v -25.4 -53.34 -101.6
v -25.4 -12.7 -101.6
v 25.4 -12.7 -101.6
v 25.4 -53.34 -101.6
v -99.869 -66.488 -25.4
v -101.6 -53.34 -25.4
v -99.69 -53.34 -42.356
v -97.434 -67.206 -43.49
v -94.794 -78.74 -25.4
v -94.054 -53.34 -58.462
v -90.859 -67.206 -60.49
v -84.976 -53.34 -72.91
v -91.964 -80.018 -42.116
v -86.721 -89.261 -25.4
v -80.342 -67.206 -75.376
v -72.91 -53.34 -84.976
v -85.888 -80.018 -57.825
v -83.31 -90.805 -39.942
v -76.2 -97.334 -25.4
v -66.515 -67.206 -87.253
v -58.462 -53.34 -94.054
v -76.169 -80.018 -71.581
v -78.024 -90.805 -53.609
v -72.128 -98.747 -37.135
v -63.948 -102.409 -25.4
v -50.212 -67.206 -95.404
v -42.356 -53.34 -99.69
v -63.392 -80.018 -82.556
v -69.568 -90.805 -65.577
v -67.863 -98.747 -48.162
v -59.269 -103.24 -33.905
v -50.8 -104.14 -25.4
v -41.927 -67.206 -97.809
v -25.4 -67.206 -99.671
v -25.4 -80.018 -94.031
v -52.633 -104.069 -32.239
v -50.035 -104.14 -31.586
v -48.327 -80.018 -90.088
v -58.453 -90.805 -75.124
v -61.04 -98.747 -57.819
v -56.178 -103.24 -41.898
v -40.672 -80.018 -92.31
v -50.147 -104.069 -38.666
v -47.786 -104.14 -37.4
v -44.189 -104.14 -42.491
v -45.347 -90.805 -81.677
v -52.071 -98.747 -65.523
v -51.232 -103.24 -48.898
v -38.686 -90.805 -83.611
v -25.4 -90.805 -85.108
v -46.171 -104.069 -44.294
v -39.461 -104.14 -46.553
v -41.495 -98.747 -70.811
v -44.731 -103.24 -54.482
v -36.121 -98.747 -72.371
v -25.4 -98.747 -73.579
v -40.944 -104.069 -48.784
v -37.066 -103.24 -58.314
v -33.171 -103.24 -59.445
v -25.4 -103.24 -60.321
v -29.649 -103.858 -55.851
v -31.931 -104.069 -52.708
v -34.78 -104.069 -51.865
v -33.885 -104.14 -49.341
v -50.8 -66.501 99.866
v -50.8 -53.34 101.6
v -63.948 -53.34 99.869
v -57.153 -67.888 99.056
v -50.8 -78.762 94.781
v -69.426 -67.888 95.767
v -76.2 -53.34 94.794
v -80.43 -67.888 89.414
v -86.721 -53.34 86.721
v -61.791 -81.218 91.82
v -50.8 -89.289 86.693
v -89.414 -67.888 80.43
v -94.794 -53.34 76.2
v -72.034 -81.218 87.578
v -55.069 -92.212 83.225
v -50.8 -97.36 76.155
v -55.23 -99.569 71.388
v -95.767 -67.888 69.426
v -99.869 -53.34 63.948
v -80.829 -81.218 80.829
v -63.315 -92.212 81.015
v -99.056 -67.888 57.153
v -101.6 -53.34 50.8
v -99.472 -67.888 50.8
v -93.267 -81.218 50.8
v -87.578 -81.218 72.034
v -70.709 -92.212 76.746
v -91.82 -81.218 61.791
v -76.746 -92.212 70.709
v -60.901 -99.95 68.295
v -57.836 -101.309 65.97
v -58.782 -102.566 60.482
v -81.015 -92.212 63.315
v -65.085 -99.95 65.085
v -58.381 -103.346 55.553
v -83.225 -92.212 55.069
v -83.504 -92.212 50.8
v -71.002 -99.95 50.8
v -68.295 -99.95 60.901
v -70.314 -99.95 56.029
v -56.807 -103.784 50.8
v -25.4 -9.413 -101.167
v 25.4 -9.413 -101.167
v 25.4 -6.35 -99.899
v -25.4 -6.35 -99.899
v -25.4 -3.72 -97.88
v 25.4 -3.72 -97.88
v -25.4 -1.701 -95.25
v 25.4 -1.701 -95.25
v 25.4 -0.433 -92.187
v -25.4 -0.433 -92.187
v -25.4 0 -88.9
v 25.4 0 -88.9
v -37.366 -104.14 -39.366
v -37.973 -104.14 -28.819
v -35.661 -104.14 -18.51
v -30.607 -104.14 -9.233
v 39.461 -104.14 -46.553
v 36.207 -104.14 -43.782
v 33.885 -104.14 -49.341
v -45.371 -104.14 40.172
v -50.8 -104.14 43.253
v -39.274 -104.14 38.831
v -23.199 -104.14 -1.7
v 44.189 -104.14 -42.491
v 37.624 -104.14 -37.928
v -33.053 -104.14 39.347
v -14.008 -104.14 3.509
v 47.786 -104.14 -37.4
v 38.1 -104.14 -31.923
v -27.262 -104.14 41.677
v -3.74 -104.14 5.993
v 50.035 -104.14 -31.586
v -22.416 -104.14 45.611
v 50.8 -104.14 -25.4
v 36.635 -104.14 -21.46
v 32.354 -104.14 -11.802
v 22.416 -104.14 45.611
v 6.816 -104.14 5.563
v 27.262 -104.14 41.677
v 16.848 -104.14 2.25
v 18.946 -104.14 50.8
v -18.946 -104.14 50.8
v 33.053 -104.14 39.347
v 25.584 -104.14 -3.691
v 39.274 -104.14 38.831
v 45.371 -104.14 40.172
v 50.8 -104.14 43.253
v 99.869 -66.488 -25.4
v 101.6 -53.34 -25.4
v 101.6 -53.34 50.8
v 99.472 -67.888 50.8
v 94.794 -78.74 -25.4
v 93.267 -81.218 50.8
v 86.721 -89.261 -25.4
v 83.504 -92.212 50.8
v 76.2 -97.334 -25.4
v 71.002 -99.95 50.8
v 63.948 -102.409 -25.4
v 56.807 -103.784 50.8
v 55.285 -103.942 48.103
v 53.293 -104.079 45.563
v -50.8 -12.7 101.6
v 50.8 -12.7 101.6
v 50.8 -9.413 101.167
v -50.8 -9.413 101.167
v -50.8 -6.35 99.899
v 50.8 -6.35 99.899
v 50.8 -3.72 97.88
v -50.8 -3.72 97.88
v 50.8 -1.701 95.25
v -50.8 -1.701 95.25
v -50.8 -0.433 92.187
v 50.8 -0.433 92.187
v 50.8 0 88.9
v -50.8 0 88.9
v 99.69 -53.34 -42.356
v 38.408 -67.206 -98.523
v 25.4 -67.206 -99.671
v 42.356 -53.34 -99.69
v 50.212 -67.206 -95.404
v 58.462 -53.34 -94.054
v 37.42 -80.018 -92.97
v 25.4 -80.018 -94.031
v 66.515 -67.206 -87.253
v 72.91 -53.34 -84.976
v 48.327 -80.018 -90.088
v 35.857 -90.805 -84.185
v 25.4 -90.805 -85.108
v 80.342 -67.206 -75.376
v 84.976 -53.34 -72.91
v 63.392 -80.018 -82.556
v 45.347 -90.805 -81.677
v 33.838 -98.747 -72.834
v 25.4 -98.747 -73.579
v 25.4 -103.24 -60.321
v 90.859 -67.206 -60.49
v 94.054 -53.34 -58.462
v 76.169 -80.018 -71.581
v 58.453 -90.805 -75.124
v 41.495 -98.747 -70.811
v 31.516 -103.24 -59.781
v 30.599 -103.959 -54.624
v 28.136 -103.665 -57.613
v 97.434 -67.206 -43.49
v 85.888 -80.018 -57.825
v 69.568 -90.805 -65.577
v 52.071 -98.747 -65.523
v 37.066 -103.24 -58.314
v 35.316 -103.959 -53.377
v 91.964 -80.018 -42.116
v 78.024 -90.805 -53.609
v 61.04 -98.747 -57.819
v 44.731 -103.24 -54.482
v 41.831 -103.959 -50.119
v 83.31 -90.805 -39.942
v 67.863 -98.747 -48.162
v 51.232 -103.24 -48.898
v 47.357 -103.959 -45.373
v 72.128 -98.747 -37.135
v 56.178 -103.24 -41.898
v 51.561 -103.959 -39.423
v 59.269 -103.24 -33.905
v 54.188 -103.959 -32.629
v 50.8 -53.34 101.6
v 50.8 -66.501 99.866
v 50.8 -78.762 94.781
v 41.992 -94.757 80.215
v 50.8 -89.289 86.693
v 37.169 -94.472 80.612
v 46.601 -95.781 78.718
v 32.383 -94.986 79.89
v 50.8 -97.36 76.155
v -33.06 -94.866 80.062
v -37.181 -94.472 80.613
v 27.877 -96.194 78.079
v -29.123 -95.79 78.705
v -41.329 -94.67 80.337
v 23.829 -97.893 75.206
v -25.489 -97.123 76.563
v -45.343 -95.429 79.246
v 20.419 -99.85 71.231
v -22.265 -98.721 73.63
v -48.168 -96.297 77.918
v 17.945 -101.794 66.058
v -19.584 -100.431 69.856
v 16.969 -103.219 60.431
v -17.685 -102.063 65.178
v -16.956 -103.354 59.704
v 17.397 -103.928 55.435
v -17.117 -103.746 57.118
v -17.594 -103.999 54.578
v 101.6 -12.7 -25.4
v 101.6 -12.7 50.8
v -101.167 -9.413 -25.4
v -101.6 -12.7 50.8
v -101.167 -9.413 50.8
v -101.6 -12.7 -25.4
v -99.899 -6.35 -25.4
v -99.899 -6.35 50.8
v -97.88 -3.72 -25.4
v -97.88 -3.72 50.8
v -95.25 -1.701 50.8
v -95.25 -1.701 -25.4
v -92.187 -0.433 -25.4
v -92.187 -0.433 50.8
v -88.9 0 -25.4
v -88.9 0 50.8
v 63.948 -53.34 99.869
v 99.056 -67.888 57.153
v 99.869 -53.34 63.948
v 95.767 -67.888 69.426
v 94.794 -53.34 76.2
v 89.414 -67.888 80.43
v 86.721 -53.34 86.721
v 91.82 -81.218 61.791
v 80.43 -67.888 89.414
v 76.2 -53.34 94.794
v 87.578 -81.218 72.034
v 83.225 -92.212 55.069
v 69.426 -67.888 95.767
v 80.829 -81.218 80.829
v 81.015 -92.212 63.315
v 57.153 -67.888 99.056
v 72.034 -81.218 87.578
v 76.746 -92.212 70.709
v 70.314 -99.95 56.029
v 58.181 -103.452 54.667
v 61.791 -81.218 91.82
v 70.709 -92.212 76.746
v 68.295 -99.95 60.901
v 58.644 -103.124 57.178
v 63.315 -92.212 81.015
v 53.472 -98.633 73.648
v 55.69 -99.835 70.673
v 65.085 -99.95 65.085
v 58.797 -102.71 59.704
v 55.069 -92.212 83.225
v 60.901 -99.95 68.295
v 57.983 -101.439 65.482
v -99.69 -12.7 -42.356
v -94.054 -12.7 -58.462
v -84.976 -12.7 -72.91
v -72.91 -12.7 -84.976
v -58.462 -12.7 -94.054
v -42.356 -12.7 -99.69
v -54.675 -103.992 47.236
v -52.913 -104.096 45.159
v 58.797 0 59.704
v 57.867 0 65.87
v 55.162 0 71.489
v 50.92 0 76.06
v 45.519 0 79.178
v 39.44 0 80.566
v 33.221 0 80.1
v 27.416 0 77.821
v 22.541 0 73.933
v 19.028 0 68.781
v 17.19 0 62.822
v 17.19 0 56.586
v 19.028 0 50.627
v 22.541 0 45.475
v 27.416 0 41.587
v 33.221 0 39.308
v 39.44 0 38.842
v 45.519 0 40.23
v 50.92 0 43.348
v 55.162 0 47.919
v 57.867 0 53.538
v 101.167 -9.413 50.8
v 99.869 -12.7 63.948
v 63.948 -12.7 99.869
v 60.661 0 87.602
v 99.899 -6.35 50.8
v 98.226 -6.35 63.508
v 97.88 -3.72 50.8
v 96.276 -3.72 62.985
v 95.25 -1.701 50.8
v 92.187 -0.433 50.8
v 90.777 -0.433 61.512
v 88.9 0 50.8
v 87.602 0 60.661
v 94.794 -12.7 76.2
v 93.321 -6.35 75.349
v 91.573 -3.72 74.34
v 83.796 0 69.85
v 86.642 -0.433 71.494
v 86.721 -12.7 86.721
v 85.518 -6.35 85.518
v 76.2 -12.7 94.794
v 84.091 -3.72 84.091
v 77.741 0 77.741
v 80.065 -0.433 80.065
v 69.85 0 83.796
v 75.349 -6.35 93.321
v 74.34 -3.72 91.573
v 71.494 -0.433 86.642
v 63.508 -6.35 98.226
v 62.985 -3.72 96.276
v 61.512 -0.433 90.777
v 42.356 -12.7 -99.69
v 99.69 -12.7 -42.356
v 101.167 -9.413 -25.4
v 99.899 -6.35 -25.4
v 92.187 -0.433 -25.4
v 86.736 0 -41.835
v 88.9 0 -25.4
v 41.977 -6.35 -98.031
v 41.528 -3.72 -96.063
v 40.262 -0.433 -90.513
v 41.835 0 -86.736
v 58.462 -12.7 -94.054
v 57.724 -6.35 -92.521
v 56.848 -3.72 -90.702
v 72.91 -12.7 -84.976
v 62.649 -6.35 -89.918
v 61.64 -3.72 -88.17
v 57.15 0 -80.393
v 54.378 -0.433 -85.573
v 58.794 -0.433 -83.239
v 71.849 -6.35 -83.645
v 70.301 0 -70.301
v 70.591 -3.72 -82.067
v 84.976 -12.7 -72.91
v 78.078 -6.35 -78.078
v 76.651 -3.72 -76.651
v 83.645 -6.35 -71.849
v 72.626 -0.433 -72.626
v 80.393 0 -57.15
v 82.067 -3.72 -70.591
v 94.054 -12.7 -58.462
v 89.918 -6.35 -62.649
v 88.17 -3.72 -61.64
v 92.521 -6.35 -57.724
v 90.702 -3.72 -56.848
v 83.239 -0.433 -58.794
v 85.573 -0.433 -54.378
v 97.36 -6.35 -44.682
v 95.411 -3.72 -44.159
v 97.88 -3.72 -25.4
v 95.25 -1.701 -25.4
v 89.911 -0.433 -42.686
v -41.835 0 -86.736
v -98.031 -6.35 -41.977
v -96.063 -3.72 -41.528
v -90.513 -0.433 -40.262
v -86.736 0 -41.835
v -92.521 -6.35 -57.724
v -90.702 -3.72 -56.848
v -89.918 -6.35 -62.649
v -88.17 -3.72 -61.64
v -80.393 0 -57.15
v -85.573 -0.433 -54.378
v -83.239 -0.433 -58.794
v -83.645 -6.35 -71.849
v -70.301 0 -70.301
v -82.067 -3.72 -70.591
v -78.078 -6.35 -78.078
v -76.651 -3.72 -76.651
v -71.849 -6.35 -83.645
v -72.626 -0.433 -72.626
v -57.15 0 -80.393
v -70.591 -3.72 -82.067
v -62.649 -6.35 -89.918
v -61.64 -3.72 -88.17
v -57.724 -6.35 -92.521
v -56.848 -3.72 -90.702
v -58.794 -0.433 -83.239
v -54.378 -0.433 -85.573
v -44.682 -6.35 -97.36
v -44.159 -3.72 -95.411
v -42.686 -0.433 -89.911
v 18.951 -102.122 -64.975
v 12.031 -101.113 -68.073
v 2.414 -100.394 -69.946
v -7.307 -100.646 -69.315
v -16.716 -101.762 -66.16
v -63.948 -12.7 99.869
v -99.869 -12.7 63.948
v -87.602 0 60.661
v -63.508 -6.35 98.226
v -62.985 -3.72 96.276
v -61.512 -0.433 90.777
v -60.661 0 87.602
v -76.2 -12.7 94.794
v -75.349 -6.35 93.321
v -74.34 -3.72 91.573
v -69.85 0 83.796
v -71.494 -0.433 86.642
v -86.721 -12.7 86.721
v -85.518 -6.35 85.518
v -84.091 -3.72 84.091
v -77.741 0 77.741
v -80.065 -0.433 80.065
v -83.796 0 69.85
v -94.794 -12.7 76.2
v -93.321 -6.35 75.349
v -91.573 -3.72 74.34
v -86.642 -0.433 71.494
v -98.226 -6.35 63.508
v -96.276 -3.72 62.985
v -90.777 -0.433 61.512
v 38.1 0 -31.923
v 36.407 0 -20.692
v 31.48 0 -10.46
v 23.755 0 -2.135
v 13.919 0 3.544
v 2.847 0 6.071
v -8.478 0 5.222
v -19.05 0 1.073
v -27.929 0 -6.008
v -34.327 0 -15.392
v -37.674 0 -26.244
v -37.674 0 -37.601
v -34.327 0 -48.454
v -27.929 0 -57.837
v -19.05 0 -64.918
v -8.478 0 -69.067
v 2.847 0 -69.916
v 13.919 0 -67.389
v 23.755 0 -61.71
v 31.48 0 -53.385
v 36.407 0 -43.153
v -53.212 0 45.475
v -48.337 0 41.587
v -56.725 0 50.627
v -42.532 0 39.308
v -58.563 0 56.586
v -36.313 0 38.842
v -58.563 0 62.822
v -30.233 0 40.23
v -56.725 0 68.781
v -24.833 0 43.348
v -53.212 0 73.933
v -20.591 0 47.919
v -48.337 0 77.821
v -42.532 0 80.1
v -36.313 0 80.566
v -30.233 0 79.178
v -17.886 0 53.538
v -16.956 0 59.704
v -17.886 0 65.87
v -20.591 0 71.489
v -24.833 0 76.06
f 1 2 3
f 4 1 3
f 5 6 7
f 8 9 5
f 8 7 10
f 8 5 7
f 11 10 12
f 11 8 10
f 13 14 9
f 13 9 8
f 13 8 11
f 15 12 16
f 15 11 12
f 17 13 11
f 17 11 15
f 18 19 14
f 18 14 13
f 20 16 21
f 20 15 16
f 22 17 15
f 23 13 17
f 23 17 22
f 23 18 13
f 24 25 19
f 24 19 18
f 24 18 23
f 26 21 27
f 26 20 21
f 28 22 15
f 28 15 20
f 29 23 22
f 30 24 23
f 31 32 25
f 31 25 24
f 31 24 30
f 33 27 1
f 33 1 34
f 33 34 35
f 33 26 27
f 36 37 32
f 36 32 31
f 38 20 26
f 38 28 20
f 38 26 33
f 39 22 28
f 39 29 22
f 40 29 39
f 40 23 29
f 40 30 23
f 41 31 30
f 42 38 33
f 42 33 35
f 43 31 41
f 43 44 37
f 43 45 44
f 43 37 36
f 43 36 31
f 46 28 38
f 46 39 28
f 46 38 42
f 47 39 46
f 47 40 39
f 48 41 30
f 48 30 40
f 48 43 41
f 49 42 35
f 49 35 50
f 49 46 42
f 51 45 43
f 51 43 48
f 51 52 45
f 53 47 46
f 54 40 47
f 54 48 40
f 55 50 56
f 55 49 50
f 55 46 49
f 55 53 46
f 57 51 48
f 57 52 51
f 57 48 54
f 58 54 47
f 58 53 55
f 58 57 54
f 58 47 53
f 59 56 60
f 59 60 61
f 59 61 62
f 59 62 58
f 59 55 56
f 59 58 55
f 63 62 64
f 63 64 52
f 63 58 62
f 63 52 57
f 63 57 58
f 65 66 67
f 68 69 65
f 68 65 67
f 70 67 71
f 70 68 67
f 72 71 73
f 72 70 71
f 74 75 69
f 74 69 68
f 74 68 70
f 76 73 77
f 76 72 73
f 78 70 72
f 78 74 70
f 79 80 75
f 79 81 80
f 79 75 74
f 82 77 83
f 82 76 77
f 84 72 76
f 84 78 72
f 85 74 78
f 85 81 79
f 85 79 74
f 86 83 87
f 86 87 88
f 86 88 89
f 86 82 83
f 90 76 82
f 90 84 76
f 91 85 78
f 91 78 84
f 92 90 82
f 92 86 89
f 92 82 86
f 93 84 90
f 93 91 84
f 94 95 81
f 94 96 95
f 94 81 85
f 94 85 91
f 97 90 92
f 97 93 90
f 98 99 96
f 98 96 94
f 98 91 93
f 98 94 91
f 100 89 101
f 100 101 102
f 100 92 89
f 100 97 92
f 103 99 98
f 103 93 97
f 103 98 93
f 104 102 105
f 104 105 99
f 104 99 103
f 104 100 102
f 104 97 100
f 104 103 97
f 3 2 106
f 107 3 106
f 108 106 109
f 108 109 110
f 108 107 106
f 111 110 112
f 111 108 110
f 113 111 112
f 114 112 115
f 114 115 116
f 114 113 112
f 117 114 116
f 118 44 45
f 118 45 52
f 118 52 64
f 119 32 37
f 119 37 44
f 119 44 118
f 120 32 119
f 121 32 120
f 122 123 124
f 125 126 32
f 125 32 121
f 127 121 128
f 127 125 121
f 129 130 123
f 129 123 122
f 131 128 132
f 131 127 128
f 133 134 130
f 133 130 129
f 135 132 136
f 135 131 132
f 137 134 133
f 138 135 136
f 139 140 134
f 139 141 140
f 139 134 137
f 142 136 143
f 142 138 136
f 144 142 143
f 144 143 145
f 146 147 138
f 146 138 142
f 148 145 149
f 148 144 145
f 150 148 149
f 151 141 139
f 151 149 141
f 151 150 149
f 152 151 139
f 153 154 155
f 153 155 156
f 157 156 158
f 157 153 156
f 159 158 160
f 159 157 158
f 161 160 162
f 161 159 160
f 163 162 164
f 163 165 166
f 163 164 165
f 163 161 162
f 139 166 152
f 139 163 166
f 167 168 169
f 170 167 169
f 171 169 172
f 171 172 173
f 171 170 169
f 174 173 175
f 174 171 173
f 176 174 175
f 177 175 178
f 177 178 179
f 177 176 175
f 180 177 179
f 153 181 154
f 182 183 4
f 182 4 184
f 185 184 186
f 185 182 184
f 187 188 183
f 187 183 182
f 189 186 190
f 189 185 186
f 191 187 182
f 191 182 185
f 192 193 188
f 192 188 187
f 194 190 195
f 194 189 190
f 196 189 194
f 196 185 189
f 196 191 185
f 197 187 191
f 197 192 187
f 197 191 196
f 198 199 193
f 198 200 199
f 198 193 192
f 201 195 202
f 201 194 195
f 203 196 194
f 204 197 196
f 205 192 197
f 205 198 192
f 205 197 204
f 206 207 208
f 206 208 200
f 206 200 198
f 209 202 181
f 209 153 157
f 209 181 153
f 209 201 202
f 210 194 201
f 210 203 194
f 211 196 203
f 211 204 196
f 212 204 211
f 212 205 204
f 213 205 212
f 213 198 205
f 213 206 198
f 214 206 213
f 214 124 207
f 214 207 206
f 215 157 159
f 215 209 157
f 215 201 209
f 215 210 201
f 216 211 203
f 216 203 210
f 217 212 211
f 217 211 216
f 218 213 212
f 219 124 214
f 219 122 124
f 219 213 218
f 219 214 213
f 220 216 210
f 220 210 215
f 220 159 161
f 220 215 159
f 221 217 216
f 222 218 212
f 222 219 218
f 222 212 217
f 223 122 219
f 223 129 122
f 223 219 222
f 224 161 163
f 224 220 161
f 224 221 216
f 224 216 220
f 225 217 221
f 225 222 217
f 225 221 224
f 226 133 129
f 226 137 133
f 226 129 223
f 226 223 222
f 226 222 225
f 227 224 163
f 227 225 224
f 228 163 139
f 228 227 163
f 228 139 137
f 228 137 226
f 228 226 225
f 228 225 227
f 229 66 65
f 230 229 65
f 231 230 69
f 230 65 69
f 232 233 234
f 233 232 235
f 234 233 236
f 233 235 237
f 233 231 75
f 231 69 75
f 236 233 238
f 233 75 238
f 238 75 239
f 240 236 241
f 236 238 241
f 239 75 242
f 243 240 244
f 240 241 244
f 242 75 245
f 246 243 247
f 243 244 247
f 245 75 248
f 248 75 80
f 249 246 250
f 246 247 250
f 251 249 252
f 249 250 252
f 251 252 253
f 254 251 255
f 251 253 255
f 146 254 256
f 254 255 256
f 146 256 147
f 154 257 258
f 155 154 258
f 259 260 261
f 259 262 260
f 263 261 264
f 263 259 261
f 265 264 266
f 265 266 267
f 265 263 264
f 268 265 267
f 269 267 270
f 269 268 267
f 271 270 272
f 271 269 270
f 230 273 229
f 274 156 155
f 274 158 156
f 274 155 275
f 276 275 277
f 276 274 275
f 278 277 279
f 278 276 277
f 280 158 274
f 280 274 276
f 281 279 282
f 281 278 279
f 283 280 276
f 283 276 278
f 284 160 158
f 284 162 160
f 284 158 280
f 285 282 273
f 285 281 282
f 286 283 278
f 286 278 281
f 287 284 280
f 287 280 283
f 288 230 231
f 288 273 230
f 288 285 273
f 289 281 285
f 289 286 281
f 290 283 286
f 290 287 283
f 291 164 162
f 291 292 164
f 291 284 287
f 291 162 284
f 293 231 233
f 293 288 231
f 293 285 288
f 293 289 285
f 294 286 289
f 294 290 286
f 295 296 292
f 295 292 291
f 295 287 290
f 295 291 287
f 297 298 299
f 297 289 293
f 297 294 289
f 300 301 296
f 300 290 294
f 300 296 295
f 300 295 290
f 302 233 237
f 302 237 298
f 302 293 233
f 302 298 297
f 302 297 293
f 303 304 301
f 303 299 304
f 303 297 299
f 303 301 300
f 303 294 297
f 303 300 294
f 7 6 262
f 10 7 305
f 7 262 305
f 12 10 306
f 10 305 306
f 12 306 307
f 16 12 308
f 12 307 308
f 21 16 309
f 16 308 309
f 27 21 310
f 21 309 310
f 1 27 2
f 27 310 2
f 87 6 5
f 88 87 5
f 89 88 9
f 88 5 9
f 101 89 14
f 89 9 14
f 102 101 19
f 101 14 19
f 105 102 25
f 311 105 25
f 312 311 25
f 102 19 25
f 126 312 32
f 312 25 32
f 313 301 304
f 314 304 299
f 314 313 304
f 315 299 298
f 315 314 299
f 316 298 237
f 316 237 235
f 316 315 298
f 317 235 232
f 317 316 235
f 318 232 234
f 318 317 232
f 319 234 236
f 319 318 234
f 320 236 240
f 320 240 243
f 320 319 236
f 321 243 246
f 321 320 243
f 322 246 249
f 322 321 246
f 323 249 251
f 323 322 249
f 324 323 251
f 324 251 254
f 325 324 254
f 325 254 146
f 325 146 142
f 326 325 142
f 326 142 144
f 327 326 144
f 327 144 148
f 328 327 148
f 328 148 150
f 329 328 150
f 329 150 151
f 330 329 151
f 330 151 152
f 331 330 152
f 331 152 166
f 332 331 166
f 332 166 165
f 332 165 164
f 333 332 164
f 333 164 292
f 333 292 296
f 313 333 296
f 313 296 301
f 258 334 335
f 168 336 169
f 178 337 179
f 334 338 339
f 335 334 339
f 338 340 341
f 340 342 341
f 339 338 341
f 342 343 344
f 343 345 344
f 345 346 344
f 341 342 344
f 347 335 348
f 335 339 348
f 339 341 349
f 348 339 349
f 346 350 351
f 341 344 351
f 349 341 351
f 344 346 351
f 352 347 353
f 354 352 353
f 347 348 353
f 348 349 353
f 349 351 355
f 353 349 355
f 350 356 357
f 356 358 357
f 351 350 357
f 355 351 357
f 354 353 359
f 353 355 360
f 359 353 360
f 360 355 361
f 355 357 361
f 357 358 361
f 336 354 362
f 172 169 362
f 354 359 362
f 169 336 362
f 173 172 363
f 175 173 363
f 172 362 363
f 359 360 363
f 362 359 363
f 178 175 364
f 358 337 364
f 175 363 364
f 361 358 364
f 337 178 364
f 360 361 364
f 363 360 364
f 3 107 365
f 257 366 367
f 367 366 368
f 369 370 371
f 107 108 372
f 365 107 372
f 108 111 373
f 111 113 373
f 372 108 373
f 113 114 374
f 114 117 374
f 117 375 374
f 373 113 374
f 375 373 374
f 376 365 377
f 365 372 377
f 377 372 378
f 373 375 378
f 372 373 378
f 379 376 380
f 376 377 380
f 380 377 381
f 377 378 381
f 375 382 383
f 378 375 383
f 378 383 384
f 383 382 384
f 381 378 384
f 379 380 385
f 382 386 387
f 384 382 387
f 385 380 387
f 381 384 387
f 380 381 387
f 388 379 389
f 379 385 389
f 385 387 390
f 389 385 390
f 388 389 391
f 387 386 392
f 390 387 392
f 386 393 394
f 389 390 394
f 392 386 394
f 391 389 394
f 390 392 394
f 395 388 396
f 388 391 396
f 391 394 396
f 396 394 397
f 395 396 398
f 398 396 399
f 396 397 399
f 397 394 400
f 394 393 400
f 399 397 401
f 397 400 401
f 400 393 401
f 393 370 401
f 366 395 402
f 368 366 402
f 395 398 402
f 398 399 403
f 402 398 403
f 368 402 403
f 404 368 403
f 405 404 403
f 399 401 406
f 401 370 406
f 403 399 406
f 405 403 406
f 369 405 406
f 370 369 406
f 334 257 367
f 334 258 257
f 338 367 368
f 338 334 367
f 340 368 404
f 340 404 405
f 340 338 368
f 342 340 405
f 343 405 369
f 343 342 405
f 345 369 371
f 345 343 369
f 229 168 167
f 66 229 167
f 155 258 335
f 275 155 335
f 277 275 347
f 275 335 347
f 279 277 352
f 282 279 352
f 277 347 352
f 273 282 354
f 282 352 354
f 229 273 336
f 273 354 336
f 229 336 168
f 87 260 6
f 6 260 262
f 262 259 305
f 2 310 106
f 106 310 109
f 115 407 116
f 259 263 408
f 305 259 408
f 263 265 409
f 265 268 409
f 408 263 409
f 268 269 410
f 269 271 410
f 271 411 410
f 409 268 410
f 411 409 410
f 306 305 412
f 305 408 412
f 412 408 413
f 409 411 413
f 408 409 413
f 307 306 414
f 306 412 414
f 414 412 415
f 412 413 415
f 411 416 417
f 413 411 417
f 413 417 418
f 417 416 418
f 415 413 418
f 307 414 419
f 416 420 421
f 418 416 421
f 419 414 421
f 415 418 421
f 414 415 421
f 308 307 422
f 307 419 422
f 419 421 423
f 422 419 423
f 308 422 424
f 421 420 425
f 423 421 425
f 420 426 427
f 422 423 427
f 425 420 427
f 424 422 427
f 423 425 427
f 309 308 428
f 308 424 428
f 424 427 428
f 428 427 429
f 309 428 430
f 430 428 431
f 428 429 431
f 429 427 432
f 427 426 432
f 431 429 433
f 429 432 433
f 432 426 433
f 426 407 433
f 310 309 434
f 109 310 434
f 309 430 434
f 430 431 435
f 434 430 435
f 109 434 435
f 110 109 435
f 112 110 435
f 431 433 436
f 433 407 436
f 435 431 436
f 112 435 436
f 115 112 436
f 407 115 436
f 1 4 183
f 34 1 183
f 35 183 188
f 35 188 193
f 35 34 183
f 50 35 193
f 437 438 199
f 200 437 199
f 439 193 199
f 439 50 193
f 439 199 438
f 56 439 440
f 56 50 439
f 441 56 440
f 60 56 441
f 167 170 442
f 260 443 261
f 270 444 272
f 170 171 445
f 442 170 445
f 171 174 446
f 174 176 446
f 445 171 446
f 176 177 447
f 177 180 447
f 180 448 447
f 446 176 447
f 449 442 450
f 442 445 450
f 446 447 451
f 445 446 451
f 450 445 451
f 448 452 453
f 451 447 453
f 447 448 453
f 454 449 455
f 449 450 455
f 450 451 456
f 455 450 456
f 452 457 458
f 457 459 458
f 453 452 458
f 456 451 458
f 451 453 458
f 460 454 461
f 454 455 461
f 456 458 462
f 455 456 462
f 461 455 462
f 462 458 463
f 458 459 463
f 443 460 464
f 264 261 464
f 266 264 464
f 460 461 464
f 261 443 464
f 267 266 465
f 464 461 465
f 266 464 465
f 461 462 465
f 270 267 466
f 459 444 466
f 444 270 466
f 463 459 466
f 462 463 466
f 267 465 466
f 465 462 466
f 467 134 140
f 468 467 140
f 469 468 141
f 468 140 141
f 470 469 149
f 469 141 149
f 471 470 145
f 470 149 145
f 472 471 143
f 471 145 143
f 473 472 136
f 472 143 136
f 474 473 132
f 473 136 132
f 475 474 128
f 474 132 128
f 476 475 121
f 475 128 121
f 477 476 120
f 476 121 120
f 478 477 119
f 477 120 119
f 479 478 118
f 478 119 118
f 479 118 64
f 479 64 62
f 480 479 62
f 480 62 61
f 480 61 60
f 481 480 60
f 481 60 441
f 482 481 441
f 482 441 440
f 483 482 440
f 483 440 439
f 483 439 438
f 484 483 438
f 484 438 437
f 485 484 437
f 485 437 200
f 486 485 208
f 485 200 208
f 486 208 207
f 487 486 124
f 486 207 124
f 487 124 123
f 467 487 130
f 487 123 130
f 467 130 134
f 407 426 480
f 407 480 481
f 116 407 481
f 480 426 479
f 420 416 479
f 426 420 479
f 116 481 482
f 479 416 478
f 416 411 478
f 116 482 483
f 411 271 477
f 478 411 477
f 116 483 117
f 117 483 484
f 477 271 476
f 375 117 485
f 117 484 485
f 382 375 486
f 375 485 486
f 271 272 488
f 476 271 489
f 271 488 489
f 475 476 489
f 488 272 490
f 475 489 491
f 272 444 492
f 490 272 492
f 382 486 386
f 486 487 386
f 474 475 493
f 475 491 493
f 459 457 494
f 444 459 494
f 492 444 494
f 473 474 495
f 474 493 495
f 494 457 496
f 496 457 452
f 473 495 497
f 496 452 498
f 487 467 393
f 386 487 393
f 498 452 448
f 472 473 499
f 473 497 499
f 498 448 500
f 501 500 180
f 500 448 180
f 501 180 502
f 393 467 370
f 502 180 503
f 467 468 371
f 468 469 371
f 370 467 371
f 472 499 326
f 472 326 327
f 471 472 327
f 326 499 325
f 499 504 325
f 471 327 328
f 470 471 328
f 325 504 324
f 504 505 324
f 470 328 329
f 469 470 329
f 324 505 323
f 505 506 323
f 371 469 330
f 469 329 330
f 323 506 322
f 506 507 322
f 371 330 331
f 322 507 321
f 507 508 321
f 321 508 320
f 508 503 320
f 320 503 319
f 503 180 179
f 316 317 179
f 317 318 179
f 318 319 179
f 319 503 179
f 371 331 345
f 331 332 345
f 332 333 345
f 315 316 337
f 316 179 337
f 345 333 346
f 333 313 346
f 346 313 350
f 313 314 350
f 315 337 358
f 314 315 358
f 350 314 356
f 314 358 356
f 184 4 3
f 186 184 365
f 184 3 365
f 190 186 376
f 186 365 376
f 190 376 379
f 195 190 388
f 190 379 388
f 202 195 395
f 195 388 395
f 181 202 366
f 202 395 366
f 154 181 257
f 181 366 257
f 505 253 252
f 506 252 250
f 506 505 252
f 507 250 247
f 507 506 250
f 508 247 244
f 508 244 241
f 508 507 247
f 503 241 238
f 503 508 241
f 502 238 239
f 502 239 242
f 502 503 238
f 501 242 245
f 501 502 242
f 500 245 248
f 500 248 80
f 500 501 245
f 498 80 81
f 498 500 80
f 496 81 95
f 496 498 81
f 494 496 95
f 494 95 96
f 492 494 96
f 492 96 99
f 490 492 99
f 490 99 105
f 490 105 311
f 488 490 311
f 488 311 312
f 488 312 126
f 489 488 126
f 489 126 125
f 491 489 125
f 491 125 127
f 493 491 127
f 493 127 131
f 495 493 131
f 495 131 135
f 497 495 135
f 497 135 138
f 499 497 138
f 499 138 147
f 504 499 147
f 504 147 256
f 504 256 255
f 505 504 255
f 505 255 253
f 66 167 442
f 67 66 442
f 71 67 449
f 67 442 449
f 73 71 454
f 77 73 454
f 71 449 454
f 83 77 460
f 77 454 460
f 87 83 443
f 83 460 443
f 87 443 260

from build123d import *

# Parameters (mm, degrees)
F0_R         = 20.9202002185
F1_DEPTH     = 104.14
F2_T1_DEPTH  = 101.6
F2_T3_DEPTH  = 76.2
F2_T5_DEPTH  = 50.8
F2_T8_ANGLE  = 90
F2_T10_ANGLE = 90
F2_T12_ANGLE = 90
F2_T14_ANGLE = 90
F3_R         = 12.7
F4_R         = 38.1
F5_DEPTH     = 104.1410001


# Not quite as in the source:
# - a fillet or chamfer that OpenCascade refuses, or shapes differently, is made with other operations: its cross-section is extruded or revolved along the edge and cut away or added


with BuildPart() as f1:
    # F0 (on Front) → F1 (new body)
    with BuildSketch(Plane.XZ):
        with BuildLine():
            Line((0, 101.6), (-50.8, 101.6))
            ThreePointArc((-50.8, 101.6), (-86.7210244843, 86.7210244843), (-101.6, 50.8))
            Line((-101.6, 50.8), (-101.6, -25.4))
            ThreePointArc((-101.6, -25.4), (-79.2815367264, -79.2815367264), (-25.4, -101.6))
            Line((-25.4, -101.6), (0, -101.6))
            Line((0, -101.6), (0, 101.6))
        make_face()
        with Locations((-37.8764681518, 59.70396474)):
            Circle(F0_R, mode=Mode.SUBTRACT)
        with BuildLine():
            Line((50.8, 101.6), (0, 101.6))
            Line((0, 101.6), (0, -101.6))
            Line((0, -101.6), (25.4, -101.6))
            ThreePointArc((25.4, -101.6), (79.2815367264, -79.2815367264), (101.6, -25.4))
            Line((101.6, -25.4), (101.6, 50.8))
            ThreePointArc((101.6, 50.8), (86.7210244843, 86.7210244843), (50.8, 101.6))
        make_face()
        with Locations((37.8764681518, 59.70396474)):
            Circle(F0_R, mode=Mode.SUBTRACT)
    extrude(amount=F1_DEPTH)

    # F2: fillet of radius 50.8 on 1 edges, made by hand

    # F2_s2 → F2_t1 (cut)
    with BuildSketch(Plane.YZ.offset(-50.8)):
        with BuildLine():
            ThreePointArc((-53.34, 101.6), (-89.2610244843, 86.7210244843), (-104.14, 50.8))
            Line((-104.14, 50.8), (-104.14, 101.6))
            Line((-104.14, 101.6), (-53.34, 101.6))
        make_face()
    extrude(amount=F2_T1_DEPTH, mode=Mode.SUBTRACT)

    # F2_s4 → F2_t3 (cut)
    with BuildSketch(Plane.XY.offset(-25.4)):
        with BuildLine():
            ThreePointArc((-101.6, -53.34), (-86.7210244843, -89.2610244843), (-50.8, -104.14))
            Line((-50.8, -104.14), (-101.6, -104.14))
            Line((-101.6, -104.14), (-101.6, -53.34))
        make_face()
        with BuildLine():
            ThreePointArc((101.6, -53.34), (86.7210244843, -89.2610244843), (50.8, -104.14))
            Line((50.8, -104.14), (101.6, -104.14))
            Line((101.6, -104.14), (101.6, -53.34))
        make_face()
    extrude(amount=F2_T3_DEPTH, mode=Mode.SUBTRACT)

    # F2_s6 → F2_t5 (cut)
    with BuildSketch(Plane.YZ.offset(-25.4)):
        with BuildLine():
            ThreePointArc((-53.34, -101.6), (-89.2610244843, -86.7210244843), (-104.14, -50.8))
            Line((-104.14, -50.8), (-104.14, -101.6))
            Line((-104.14, -101.6), (-53.34, -101.6))
        make_face()
    extrude(amount=F2_T5_DEPTH, mode=Mode.SUBTRACT)

    # F2_s7 → F2_t8 (revolve, cut)
    with BuildSketch(Plane.YZ.offset(-50.8)):
        with BuildLine():
            ThreePointArc((-53.34, 101.6), (-89.2610244843, 86.7210244843), (-104.14, 50.8))
            Line((-104.14, 50.8), (-104.14, 101.6))
            Line((-104.14, 101.6), (-53.34, 101.6))
        make_face()
    revolve(axis=Axis((-50.8, -104.14, 50.8), (0, -1, 0)), revolution_arc=F2_T8_ANGLE, mode=Mode.SUBTRACT)

    # F2_s9 → F2_t10 (revolve, cut)
    with BuildSketch(Plane.XY.offset(-25.4)):
        with BuildLine():
            ThreePointArc((-101.6, -53.34), (-86.7210244843, -89.2610244843), (-50.8, -104.14))
            Line((-50.8, -104.14), (-101.6, -104.14))
            Line((-101.6, -104.14), (-101.6, -53.34))
        make_face()
    revolve(axis=Axis((-25.4, -104.14, -25.4), (0, -1, 0)), revolution_arc=F2_T10_ANGLE, mode=Mode.SUBTRACT)

    # F2_s11 → F2_t12 (revolve, cut)
    with BuildSketch(Plane.YZ.offset(25.4)):
        with BuildLine():
            ThreePointArc((-53.34, -101.6), (-89.2610244843, -86.7210244843), (-104.14, -50.8))
            Line((-104.14, -50.8), (-104.14, -101.6))
            Line((-104.14, -101.6), (-53.34, -101.6))
        make_face()
    revolve(axis=Axis((25.4, -104.14, -25.4), (0, -1, 0)), revolution_arc=F2_T12_ANGLE, mode=Mode.SUBTRACT)

    # F2_s13 → F2_t14 (revolve, cut)
    with BuildSketch(Plane.XY.offset(50.8)):
        with BuildLine():
            ThreePointArc((101.6, -53.34), (86.7210244843, -89.2610244843), (50.8, -104.14))
            Line((50.8, -104.14), (101.6, -104.14))
            Line((101.6, -104.14), (101.6, -53.34))
        make_face()
    revolve(axis=Axis((50.8, -104.14, 50.8), (0, -1, 0)), revolution_arc=F2_T14_ANGLE, mode=Mode.SUBTRACT)

    # F3
    f3_edges = [f1.edges().sort_by_distance(p)[0] for p in [
        (-86.721024, 0, 86.721024),
    ]]
    fillet(f3_edges, radius=F3_R)

    # F4 (on face) → F5 (cut, through all)
    with BuildSketch(Plane.XZ.offset(104.14)):
        with Locations((0, -31.9225803405)):
            Circle(F4_R)
    extrude(amount=-F5_DEPTH, mode=Mode.SUBTRACT)


solid = f1.part
